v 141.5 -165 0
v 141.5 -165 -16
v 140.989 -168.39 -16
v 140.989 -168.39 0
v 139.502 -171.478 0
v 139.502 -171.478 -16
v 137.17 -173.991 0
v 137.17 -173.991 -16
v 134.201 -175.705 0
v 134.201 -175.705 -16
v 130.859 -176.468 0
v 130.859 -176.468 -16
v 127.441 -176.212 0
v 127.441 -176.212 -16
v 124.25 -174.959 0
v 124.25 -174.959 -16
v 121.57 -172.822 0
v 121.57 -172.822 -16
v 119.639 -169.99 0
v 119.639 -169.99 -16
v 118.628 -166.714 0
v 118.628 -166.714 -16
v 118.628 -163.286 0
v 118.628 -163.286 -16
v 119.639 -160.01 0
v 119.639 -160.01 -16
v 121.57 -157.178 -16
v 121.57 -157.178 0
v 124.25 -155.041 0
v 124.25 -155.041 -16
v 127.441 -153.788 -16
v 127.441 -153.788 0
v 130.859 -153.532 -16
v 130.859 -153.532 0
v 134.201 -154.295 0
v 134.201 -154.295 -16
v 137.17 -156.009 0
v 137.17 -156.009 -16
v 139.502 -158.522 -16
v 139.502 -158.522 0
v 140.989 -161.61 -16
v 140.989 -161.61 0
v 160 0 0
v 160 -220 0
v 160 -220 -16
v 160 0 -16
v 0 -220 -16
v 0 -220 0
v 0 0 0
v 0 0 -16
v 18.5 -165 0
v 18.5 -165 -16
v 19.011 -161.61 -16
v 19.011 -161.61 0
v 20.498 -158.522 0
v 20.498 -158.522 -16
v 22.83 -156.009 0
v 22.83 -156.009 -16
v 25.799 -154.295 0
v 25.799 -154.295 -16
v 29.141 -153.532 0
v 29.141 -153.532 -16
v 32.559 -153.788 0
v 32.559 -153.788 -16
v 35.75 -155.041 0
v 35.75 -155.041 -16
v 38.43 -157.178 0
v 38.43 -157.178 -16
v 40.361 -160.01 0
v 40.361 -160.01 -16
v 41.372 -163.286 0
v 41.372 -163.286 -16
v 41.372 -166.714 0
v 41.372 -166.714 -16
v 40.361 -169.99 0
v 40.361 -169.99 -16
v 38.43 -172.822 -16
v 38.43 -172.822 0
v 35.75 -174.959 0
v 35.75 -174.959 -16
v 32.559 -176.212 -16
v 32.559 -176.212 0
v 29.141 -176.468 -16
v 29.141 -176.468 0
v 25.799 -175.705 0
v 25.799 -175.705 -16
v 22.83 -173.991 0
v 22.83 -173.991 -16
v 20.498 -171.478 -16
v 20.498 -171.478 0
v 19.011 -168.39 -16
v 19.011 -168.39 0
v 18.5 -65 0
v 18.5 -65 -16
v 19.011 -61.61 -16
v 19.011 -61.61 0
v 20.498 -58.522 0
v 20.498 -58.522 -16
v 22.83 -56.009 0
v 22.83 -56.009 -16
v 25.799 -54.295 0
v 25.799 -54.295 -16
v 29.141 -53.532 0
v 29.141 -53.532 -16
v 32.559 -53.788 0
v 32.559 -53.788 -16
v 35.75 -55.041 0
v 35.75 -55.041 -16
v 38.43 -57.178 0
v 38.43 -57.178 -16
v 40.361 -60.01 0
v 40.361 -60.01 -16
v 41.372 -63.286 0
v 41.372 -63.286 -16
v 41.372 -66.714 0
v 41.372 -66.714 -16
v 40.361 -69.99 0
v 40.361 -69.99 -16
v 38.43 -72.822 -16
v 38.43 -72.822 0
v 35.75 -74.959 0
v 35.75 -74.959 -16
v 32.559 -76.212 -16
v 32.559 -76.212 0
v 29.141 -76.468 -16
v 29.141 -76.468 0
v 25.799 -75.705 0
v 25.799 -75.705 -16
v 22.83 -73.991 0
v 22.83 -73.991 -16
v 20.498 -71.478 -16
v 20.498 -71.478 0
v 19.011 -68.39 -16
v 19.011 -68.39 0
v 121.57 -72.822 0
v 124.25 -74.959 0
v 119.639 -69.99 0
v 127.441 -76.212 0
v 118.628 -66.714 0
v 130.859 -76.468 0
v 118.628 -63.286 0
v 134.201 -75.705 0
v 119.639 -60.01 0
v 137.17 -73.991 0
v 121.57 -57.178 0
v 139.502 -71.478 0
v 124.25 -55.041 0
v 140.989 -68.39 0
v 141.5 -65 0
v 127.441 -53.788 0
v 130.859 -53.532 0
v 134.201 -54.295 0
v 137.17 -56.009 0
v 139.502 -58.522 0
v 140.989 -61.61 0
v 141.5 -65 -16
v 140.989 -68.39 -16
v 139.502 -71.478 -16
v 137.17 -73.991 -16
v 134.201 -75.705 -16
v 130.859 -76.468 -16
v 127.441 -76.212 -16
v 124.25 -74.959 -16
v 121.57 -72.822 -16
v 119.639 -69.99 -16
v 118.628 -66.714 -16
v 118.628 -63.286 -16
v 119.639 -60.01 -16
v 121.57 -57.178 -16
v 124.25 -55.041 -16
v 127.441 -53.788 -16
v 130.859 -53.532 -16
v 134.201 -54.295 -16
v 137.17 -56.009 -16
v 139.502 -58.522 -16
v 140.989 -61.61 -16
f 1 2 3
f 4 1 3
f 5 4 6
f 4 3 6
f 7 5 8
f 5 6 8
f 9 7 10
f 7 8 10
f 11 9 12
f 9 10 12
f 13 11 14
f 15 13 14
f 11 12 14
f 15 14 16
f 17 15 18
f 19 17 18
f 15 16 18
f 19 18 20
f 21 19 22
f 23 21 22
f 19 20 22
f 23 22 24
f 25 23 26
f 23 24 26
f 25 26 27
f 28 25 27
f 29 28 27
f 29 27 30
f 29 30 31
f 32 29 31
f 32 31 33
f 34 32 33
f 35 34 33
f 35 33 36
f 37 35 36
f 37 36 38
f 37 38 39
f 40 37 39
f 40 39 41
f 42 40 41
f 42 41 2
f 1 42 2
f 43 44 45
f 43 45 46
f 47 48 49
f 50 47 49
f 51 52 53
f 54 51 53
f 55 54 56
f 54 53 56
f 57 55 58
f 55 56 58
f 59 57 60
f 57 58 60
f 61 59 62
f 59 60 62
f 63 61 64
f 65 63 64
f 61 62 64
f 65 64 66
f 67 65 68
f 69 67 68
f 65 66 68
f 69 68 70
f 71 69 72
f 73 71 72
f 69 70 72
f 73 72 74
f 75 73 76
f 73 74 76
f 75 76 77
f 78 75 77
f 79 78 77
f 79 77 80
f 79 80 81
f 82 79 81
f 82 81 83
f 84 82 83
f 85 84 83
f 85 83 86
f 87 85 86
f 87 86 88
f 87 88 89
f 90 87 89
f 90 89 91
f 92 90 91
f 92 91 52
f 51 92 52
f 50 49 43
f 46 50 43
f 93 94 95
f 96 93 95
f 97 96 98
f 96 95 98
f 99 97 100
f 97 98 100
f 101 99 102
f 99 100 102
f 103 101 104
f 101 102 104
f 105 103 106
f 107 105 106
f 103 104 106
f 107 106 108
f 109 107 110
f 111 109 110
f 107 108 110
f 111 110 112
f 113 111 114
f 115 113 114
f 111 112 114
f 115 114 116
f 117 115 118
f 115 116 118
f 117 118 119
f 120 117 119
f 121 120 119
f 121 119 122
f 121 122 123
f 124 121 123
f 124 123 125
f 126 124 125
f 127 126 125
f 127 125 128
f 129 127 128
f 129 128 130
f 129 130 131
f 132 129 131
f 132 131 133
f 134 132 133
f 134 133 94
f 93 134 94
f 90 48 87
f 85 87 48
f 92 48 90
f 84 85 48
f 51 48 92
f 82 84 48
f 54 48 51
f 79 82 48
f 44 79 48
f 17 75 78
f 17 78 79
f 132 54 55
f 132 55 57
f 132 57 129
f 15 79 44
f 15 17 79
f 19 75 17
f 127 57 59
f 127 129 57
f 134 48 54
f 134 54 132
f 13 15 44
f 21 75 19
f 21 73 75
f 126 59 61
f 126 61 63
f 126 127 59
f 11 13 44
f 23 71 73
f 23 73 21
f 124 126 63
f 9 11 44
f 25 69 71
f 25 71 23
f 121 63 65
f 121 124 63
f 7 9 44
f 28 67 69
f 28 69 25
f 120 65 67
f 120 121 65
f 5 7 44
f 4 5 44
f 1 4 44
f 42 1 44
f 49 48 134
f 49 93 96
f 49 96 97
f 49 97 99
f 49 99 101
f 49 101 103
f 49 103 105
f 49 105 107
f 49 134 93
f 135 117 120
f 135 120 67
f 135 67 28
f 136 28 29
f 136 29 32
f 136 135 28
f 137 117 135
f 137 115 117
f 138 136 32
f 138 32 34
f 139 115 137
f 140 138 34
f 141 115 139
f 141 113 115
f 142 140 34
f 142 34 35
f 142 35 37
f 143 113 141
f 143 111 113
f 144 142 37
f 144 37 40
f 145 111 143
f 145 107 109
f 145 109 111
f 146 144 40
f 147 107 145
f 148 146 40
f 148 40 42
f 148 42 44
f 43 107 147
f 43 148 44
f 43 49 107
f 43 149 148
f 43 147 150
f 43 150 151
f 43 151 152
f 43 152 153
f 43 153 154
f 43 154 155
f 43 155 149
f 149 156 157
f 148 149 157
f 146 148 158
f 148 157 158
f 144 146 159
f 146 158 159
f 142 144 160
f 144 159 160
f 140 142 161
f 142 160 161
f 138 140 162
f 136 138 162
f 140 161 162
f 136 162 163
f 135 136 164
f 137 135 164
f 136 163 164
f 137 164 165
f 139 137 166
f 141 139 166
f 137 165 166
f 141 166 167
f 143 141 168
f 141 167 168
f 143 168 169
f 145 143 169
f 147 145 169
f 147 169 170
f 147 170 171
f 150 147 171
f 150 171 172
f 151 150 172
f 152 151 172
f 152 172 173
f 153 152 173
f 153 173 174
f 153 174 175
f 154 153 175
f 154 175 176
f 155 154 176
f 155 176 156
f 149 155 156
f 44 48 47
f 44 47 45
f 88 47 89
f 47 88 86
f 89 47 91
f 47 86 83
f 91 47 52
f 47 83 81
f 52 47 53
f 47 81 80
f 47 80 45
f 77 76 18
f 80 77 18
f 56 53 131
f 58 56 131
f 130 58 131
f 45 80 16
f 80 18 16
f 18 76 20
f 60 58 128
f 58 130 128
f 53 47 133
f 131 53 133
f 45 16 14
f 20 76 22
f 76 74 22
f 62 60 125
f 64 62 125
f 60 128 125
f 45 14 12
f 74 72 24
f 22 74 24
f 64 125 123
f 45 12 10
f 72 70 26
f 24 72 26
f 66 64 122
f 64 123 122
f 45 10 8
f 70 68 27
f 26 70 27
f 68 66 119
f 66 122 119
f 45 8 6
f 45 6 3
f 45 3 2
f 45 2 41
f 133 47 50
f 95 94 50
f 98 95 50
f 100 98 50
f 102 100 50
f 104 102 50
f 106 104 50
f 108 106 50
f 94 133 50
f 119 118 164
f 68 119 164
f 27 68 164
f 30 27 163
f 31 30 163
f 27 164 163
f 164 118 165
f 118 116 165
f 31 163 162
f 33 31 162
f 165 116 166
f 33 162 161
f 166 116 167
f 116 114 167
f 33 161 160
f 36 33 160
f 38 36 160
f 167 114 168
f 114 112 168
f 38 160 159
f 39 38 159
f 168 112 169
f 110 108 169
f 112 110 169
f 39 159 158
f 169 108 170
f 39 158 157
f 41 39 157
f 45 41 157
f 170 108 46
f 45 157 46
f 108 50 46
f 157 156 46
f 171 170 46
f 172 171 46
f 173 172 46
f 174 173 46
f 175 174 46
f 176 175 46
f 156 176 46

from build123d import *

# Parameters (mm, degrees)
SKETCH_1_W             = 160
SKETCH_1_H             = 220
SM_BASE_FLANGE_1_DEPTH = 16
SKETCH_2_R             = 11.5
CUT_EXTRUDE_1_DEPTH    = 30


# Sheet-metal steps are written as plain solids
with BuildPart() as part:
    # Sketch 1 → Базовая кромка1 (new body)
    with BuildSketch(Plane.XY):
        with Locations((80, -110)):
            Rectangle(SKETCH_1_W, SKETCH_1_H)
    extrude(amount=-SM_BASE_FLANGE_1_DEPTH)

    # Sketch 2 → Вырез-Вытянуть1 (cut)
    with BuildSketch(Plane(origin=(0, 0, -16), x_dir=(-1, 0, 0), z_dir=(0, 0, -1))):
        with Locations((-30, -165)):
            Circle(SKETCH_2_R)
        with Locations((-30, -65)):
            Circle(SKETCH_2_R)
        with Locations(Location((-130, -165, 0), (0, 0, 180))):
            Circle(SKETCH_2_R)
        with Locations(Location((-130, -65, 0), (0, 0, 180))):
            Circle(SKETCH_2_R)
    extrude(amount=-CUT_EXTRUDE_1_DEPTH, mode=Mode.SUBTRACT)


solid = part.part
